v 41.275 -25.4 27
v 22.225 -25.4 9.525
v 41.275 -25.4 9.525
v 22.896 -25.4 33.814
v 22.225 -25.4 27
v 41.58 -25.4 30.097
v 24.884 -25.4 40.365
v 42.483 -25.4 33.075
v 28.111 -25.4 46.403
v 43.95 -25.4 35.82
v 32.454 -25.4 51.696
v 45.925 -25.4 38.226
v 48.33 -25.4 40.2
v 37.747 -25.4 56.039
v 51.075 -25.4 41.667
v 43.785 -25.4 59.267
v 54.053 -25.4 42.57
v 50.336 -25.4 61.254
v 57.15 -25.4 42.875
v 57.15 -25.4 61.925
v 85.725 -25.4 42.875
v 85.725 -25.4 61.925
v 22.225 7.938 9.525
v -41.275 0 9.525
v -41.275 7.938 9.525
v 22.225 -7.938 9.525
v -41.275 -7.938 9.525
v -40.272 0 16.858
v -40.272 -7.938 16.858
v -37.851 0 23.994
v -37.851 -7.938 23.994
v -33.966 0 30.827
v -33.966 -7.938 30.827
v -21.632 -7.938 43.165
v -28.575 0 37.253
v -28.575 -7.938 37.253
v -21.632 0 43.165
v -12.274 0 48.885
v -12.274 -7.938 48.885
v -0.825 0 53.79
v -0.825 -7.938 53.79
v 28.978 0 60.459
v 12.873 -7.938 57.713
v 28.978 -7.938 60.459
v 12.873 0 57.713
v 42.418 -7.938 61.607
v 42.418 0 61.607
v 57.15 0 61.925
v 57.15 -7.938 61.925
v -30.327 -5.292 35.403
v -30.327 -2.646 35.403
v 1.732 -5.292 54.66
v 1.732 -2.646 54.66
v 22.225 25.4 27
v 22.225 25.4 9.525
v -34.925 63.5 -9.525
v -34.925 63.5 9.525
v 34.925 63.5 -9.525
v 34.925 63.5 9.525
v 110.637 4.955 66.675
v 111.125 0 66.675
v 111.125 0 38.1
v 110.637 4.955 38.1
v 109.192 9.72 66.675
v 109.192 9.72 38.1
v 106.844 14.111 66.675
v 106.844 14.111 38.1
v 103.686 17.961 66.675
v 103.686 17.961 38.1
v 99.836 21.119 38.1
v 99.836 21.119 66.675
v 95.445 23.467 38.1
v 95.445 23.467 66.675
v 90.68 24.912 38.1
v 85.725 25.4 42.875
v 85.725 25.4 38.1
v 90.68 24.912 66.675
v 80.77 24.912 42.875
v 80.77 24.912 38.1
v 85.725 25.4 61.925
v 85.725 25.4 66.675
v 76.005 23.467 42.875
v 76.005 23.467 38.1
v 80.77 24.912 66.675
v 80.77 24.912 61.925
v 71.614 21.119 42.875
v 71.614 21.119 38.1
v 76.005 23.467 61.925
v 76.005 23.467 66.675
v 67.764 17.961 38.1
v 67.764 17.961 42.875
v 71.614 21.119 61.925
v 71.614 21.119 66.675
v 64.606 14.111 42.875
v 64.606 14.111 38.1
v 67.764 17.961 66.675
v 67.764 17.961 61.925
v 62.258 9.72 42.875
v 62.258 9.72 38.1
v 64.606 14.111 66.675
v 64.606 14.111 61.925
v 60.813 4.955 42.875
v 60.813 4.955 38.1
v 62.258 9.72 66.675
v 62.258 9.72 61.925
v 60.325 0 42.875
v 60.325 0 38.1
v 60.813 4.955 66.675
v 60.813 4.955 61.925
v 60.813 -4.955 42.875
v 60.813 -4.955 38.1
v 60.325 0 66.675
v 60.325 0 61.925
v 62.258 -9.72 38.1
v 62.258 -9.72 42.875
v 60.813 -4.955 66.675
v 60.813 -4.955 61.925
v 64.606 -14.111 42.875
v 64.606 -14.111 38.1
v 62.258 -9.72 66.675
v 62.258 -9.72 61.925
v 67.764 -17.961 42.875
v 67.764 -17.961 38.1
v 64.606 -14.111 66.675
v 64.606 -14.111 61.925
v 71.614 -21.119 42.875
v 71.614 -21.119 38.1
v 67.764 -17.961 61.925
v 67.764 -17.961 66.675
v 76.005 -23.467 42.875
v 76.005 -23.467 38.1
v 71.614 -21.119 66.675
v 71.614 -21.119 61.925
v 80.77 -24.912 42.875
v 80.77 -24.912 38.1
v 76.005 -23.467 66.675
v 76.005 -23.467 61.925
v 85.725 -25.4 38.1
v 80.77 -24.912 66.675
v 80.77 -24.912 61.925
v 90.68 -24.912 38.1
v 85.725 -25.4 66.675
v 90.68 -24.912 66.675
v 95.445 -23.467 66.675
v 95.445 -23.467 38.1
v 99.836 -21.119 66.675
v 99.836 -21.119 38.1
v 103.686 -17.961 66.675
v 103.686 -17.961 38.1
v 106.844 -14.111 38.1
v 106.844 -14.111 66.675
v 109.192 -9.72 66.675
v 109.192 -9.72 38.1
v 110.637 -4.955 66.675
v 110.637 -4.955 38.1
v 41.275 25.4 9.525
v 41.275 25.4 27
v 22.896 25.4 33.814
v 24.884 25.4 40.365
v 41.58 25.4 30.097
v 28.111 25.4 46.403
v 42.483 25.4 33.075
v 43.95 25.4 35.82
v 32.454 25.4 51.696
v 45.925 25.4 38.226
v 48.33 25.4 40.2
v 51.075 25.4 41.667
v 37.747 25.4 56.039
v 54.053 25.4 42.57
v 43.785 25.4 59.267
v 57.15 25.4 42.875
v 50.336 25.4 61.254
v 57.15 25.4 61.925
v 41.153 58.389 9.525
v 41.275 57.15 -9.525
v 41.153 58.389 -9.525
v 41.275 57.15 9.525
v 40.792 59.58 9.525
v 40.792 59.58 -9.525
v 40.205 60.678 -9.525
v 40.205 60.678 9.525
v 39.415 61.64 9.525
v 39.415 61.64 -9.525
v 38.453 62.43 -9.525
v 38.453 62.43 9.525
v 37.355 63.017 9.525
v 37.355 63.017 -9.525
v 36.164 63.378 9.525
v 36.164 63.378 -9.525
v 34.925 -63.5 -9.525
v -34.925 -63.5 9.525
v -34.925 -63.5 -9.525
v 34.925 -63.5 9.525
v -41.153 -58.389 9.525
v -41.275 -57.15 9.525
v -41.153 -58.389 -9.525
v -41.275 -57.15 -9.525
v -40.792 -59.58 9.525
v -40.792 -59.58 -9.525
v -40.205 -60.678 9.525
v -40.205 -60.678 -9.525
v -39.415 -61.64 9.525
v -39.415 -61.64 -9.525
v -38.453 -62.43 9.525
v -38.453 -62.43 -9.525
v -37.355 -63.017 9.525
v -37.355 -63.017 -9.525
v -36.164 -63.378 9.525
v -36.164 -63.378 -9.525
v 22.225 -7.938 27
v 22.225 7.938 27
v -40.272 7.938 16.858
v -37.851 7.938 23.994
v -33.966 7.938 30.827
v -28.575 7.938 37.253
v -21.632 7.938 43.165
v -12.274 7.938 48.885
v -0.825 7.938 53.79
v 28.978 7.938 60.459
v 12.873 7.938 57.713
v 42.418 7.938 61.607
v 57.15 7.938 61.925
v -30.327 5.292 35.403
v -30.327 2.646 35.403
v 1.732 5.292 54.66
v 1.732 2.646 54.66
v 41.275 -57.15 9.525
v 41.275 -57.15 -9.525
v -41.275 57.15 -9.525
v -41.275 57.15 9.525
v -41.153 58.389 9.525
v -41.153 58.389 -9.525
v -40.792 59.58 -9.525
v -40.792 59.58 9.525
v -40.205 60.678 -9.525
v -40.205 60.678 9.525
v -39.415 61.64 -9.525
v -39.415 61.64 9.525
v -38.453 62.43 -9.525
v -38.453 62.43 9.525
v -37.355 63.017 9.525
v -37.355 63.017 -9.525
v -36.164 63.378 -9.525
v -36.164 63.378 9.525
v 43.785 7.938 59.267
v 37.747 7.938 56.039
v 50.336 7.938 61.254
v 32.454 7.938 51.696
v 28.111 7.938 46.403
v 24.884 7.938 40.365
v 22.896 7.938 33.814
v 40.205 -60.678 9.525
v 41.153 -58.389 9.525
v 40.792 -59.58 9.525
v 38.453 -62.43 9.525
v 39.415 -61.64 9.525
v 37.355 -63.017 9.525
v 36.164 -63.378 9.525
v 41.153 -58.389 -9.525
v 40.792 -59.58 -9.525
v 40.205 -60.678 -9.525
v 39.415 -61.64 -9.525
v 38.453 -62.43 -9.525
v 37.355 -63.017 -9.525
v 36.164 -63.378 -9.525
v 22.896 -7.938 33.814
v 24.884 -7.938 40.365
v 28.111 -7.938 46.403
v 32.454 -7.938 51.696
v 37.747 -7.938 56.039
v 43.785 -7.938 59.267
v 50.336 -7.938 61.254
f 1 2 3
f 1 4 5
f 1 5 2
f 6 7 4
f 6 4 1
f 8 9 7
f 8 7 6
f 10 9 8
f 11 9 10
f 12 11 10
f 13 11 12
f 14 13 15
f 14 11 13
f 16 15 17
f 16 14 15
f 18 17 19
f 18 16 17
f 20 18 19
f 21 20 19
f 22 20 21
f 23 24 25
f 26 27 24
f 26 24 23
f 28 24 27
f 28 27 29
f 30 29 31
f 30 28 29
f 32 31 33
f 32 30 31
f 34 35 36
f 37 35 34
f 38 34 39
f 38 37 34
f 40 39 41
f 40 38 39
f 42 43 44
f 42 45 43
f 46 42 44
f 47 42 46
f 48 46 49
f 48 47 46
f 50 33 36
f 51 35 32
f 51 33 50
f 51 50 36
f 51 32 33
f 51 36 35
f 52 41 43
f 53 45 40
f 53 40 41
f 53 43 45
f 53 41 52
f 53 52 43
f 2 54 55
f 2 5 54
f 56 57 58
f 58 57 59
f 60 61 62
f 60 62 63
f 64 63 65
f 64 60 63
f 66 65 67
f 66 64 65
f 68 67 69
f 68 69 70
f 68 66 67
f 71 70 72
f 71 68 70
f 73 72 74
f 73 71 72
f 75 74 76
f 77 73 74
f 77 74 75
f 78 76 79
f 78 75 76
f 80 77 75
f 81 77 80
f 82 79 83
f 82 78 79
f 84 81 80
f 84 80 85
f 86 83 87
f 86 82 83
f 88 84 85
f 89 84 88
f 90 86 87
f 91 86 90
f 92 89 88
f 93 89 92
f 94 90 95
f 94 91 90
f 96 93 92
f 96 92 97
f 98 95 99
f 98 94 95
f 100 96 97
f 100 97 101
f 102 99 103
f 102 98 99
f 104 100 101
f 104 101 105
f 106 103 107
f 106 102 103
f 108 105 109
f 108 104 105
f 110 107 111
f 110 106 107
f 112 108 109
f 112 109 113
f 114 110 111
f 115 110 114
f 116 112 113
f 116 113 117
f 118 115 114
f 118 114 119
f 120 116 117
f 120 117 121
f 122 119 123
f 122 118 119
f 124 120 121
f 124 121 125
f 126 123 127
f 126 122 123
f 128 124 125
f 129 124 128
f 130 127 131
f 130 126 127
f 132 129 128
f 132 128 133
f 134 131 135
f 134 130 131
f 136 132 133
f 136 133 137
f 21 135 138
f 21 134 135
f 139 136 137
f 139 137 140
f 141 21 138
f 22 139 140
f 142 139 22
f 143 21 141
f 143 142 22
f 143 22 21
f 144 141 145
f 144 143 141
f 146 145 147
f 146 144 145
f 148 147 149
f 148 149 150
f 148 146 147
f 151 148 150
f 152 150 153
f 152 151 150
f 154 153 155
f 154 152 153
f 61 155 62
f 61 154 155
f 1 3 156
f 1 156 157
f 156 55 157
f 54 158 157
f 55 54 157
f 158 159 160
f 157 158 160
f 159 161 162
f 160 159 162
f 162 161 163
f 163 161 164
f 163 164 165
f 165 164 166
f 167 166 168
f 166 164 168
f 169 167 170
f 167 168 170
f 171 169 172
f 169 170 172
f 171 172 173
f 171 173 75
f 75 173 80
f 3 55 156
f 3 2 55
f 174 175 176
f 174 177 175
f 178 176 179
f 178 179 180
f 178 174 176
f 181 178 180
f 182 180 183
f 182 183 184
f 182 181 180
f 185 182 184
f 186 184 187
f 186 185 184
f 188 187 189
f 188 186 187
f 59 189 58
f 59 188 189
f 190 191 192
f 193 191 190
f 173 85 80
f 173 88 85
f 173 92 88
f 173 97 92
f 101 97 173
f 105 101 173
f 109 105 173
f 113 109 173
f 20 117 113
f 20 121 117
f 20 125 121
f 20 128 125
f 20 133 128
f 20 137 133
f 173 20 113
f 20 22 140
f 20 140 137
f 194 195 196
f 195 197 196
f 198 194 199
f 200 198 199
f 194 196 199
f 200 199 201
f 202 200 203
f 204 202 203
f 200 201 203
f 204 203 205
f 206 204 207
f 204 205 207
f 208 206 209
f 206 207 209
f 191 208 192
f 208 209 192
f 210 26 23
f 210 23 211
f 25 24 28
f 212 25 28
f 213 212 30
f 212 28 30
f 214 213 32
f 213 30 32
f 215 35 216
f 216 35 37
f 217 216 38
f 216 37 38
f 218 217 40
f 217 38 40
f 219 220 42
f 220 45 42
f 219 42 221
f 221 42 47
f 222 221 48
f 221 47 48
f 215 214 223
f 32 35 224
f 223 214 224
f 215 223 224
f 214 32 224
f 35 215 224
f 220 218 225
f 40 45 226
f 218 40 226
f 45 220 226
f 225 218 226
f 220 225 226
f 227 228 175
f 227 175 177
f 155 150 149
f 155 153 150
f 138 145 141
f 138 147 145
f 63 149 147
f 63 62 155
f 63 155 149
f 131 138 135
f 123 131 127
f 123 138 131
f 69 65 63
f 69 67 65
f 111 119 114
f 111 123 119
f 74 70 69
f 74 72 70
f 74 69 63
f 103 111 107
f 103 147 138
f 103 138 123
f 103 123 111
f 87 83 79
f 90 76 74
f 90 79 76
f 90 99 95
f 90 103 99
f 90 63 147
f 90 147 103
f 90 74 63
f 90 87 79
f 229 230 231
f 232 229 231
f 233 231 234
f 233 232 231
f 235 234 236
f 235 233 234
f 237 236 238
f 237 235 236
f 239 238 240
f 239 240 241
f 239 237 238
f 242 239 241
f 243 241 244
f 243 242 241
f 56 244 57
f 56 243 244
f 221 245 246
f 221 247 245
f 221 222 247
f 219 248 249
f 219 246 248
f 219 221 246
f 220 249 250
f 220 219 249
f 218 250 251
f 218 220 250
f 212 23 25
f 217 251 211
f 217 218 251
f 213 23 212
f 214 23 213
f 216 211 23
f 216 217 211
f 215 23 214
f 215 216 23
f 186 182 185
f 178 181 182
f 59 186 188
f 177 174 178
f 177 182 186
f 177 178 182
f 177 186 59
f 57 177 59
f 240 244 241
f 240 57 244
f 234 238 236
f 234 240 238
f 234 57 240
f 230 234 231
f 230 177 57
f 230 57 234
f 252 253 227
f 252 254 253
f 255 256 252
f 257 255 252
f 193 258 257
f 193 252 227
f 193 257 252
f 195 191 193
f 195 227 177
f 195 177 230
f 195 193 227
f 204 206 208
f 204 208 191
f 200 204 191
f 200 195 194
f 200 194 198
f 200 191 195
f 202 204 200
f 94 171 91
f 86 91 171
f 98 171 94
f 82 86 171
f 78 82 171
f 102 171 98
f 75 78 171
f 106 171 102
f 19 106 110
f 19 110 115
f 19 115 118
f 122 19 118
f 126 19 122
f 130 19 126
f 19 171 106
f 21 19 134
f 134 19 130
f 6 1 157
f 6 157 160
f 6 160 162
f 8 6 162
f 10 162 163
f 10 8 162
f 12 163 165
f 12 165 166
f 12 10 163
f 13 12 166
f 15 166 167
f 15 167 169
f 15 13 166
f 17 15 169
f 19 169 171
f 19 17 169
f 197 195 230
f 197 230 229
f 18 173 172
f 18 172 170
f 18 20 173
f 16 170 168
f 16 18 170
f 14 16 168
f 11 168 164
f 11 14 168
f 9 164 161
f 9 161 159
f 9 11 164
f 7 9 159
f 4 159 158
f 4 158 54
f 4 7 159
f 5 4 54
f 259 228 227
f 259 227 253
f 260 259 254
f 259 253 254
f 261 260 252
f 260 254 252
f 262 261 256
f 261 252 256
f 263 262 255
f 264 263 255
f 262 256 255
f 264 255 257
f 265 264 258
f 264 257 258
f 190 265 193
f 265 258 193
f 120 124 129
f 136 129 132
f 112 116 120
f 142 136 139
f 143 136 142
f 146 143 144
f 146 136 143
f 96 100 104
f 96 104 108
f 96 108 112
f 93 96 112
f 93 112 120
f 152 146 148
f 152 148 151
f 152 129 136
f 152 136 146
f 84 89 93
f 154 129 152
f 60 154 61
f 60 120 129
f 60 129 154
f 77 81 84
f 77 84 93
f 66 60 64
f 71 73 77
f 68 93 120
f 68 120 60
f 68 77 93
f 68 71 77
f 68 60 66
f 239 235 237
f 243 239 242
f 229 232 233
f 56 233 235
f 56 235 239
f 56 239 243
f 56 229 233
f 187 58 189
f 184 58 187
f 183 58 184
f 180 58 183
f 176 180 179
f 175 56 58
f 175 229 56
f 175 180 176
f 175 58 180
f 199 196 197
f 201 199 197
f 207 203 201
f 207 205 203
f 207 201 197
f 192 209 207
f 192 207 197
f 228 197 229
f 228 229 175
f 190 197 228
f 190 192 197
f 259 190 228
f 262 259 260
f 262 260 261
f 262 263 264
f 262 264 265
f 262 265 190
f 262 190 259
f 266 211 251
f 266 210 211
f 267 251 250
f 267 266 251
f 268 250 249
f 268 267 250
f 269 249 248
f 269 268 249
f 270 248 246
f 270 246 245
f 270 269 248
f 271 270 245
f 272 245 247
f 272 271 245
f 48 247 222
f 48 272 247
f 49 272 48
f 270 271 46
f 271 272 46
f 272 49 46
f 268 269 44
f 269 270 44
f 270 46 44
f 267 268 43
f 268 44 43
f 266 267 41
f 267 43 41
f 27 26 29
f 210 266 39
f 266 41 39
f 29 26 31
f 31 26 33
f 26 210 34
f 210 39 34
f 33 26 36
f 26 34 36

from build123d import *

# Parameters (mm, degrees)
F1_DEPTH = 63.5
F0_W     = 25.4
F0_H     = 19.05
F2_DEPTH = 25.4
F3_DEPTH = 7.9375
F5_R     = 6.35


with BuildPart() as f1:
    # F0 (on Front) → F1 (new body, symmetric)
    with BuildSketch(Plane.XZ):
        Polygon((-41.275, 9.525), (-41.275, -9.525), (41.275, -9.525), (41.275, 9.525), (22.225, 9.525), align=None)
    extrude(amount=F1_DEPTH, both=True)

    # F5
    f5_edges = [f1.edges().sort_by_distance(p)[0] for p in [
        (-41.275, -63.5, 0),
        (41.275, -63.5, 0),
        (-41.275, 63.5, 0),
        (41.275, 63.5, 0),
    ]]
    fillet(f5_edges, radius=F5_R)


with BuildPart() as f2:
    # F0 (on Front) → F2 (new body, symmetric)
    with BuildSketch(Plane.XZ):
        with BuildLine():
            Line((22.225, 9.525), (41.275, 9.525))
            Line((41.275, 9.525), (41.275, 27.0002))
            ThreePointArc((41.275, 27.0002), (45.9246798487, 38.2255201513), (57.15, 42.8752))
            Line((57.15, 42.8752), (60.325, 42.8752))
            Line((60.325, 42.8752), (60.325, 61.9252))
            Line((60.325, 61.9252), (57.15, 61.9252))
            ThreePointArc((57.15, 61.9252), (32.4542956671, 51.6959043329), (22.225, 27.0002))
            Line((22.225, 27.0002), (22.225, 9.525))
        make_face()
        with Locations((73.025, 52.4002)):
            Rectangle(F0_W, F0_H)
    extrude(amount=F2_DEPTH, both=True)

    # F0 (on Front) → F4 (revolve)
    with BuildSketch(Plane.XZ):
        Polygon((85.725, 66.675), (85.725, 61.9252), (85.725, 42.8752), (85.725, 38.1), (111.125, 38.1), (111.125, 66.675), align=None)
    revolve(axis=Axis((85.725, 0, 52.3875), (0, 0, 1)))


with BuildPart() as f3:
    # F0 (on Front) → F3 (new body, symmetric)
    with BuildSketch(Plane.XZ):
        with BuildLine():
            add(Edge.make_bspline(
                [(-41.275, 9.525), (-40.1333869527, 36.9227183817), (-10.6978429799, 62.4466641721), (57.15, 61.9252)],
                knots=[0, 0, 0, 0, 111.5045361635, 111.5045361635, 111.5045361635, 111.5045361635], degree=3))
            Line((-41.275, 9.525), (22.225, 9.525))
            Line((22.225, 9.525), (22.225, 27.0002))
            ThreePointArc((22.225, 27.0002), (32.4542956671, 51.6959043329), (57.15, 61.9252))
        make_face()
    extrude(amount=F3_DEPTH, both=True)


solid = Compound([f1.part, f2.part, f3.part])
